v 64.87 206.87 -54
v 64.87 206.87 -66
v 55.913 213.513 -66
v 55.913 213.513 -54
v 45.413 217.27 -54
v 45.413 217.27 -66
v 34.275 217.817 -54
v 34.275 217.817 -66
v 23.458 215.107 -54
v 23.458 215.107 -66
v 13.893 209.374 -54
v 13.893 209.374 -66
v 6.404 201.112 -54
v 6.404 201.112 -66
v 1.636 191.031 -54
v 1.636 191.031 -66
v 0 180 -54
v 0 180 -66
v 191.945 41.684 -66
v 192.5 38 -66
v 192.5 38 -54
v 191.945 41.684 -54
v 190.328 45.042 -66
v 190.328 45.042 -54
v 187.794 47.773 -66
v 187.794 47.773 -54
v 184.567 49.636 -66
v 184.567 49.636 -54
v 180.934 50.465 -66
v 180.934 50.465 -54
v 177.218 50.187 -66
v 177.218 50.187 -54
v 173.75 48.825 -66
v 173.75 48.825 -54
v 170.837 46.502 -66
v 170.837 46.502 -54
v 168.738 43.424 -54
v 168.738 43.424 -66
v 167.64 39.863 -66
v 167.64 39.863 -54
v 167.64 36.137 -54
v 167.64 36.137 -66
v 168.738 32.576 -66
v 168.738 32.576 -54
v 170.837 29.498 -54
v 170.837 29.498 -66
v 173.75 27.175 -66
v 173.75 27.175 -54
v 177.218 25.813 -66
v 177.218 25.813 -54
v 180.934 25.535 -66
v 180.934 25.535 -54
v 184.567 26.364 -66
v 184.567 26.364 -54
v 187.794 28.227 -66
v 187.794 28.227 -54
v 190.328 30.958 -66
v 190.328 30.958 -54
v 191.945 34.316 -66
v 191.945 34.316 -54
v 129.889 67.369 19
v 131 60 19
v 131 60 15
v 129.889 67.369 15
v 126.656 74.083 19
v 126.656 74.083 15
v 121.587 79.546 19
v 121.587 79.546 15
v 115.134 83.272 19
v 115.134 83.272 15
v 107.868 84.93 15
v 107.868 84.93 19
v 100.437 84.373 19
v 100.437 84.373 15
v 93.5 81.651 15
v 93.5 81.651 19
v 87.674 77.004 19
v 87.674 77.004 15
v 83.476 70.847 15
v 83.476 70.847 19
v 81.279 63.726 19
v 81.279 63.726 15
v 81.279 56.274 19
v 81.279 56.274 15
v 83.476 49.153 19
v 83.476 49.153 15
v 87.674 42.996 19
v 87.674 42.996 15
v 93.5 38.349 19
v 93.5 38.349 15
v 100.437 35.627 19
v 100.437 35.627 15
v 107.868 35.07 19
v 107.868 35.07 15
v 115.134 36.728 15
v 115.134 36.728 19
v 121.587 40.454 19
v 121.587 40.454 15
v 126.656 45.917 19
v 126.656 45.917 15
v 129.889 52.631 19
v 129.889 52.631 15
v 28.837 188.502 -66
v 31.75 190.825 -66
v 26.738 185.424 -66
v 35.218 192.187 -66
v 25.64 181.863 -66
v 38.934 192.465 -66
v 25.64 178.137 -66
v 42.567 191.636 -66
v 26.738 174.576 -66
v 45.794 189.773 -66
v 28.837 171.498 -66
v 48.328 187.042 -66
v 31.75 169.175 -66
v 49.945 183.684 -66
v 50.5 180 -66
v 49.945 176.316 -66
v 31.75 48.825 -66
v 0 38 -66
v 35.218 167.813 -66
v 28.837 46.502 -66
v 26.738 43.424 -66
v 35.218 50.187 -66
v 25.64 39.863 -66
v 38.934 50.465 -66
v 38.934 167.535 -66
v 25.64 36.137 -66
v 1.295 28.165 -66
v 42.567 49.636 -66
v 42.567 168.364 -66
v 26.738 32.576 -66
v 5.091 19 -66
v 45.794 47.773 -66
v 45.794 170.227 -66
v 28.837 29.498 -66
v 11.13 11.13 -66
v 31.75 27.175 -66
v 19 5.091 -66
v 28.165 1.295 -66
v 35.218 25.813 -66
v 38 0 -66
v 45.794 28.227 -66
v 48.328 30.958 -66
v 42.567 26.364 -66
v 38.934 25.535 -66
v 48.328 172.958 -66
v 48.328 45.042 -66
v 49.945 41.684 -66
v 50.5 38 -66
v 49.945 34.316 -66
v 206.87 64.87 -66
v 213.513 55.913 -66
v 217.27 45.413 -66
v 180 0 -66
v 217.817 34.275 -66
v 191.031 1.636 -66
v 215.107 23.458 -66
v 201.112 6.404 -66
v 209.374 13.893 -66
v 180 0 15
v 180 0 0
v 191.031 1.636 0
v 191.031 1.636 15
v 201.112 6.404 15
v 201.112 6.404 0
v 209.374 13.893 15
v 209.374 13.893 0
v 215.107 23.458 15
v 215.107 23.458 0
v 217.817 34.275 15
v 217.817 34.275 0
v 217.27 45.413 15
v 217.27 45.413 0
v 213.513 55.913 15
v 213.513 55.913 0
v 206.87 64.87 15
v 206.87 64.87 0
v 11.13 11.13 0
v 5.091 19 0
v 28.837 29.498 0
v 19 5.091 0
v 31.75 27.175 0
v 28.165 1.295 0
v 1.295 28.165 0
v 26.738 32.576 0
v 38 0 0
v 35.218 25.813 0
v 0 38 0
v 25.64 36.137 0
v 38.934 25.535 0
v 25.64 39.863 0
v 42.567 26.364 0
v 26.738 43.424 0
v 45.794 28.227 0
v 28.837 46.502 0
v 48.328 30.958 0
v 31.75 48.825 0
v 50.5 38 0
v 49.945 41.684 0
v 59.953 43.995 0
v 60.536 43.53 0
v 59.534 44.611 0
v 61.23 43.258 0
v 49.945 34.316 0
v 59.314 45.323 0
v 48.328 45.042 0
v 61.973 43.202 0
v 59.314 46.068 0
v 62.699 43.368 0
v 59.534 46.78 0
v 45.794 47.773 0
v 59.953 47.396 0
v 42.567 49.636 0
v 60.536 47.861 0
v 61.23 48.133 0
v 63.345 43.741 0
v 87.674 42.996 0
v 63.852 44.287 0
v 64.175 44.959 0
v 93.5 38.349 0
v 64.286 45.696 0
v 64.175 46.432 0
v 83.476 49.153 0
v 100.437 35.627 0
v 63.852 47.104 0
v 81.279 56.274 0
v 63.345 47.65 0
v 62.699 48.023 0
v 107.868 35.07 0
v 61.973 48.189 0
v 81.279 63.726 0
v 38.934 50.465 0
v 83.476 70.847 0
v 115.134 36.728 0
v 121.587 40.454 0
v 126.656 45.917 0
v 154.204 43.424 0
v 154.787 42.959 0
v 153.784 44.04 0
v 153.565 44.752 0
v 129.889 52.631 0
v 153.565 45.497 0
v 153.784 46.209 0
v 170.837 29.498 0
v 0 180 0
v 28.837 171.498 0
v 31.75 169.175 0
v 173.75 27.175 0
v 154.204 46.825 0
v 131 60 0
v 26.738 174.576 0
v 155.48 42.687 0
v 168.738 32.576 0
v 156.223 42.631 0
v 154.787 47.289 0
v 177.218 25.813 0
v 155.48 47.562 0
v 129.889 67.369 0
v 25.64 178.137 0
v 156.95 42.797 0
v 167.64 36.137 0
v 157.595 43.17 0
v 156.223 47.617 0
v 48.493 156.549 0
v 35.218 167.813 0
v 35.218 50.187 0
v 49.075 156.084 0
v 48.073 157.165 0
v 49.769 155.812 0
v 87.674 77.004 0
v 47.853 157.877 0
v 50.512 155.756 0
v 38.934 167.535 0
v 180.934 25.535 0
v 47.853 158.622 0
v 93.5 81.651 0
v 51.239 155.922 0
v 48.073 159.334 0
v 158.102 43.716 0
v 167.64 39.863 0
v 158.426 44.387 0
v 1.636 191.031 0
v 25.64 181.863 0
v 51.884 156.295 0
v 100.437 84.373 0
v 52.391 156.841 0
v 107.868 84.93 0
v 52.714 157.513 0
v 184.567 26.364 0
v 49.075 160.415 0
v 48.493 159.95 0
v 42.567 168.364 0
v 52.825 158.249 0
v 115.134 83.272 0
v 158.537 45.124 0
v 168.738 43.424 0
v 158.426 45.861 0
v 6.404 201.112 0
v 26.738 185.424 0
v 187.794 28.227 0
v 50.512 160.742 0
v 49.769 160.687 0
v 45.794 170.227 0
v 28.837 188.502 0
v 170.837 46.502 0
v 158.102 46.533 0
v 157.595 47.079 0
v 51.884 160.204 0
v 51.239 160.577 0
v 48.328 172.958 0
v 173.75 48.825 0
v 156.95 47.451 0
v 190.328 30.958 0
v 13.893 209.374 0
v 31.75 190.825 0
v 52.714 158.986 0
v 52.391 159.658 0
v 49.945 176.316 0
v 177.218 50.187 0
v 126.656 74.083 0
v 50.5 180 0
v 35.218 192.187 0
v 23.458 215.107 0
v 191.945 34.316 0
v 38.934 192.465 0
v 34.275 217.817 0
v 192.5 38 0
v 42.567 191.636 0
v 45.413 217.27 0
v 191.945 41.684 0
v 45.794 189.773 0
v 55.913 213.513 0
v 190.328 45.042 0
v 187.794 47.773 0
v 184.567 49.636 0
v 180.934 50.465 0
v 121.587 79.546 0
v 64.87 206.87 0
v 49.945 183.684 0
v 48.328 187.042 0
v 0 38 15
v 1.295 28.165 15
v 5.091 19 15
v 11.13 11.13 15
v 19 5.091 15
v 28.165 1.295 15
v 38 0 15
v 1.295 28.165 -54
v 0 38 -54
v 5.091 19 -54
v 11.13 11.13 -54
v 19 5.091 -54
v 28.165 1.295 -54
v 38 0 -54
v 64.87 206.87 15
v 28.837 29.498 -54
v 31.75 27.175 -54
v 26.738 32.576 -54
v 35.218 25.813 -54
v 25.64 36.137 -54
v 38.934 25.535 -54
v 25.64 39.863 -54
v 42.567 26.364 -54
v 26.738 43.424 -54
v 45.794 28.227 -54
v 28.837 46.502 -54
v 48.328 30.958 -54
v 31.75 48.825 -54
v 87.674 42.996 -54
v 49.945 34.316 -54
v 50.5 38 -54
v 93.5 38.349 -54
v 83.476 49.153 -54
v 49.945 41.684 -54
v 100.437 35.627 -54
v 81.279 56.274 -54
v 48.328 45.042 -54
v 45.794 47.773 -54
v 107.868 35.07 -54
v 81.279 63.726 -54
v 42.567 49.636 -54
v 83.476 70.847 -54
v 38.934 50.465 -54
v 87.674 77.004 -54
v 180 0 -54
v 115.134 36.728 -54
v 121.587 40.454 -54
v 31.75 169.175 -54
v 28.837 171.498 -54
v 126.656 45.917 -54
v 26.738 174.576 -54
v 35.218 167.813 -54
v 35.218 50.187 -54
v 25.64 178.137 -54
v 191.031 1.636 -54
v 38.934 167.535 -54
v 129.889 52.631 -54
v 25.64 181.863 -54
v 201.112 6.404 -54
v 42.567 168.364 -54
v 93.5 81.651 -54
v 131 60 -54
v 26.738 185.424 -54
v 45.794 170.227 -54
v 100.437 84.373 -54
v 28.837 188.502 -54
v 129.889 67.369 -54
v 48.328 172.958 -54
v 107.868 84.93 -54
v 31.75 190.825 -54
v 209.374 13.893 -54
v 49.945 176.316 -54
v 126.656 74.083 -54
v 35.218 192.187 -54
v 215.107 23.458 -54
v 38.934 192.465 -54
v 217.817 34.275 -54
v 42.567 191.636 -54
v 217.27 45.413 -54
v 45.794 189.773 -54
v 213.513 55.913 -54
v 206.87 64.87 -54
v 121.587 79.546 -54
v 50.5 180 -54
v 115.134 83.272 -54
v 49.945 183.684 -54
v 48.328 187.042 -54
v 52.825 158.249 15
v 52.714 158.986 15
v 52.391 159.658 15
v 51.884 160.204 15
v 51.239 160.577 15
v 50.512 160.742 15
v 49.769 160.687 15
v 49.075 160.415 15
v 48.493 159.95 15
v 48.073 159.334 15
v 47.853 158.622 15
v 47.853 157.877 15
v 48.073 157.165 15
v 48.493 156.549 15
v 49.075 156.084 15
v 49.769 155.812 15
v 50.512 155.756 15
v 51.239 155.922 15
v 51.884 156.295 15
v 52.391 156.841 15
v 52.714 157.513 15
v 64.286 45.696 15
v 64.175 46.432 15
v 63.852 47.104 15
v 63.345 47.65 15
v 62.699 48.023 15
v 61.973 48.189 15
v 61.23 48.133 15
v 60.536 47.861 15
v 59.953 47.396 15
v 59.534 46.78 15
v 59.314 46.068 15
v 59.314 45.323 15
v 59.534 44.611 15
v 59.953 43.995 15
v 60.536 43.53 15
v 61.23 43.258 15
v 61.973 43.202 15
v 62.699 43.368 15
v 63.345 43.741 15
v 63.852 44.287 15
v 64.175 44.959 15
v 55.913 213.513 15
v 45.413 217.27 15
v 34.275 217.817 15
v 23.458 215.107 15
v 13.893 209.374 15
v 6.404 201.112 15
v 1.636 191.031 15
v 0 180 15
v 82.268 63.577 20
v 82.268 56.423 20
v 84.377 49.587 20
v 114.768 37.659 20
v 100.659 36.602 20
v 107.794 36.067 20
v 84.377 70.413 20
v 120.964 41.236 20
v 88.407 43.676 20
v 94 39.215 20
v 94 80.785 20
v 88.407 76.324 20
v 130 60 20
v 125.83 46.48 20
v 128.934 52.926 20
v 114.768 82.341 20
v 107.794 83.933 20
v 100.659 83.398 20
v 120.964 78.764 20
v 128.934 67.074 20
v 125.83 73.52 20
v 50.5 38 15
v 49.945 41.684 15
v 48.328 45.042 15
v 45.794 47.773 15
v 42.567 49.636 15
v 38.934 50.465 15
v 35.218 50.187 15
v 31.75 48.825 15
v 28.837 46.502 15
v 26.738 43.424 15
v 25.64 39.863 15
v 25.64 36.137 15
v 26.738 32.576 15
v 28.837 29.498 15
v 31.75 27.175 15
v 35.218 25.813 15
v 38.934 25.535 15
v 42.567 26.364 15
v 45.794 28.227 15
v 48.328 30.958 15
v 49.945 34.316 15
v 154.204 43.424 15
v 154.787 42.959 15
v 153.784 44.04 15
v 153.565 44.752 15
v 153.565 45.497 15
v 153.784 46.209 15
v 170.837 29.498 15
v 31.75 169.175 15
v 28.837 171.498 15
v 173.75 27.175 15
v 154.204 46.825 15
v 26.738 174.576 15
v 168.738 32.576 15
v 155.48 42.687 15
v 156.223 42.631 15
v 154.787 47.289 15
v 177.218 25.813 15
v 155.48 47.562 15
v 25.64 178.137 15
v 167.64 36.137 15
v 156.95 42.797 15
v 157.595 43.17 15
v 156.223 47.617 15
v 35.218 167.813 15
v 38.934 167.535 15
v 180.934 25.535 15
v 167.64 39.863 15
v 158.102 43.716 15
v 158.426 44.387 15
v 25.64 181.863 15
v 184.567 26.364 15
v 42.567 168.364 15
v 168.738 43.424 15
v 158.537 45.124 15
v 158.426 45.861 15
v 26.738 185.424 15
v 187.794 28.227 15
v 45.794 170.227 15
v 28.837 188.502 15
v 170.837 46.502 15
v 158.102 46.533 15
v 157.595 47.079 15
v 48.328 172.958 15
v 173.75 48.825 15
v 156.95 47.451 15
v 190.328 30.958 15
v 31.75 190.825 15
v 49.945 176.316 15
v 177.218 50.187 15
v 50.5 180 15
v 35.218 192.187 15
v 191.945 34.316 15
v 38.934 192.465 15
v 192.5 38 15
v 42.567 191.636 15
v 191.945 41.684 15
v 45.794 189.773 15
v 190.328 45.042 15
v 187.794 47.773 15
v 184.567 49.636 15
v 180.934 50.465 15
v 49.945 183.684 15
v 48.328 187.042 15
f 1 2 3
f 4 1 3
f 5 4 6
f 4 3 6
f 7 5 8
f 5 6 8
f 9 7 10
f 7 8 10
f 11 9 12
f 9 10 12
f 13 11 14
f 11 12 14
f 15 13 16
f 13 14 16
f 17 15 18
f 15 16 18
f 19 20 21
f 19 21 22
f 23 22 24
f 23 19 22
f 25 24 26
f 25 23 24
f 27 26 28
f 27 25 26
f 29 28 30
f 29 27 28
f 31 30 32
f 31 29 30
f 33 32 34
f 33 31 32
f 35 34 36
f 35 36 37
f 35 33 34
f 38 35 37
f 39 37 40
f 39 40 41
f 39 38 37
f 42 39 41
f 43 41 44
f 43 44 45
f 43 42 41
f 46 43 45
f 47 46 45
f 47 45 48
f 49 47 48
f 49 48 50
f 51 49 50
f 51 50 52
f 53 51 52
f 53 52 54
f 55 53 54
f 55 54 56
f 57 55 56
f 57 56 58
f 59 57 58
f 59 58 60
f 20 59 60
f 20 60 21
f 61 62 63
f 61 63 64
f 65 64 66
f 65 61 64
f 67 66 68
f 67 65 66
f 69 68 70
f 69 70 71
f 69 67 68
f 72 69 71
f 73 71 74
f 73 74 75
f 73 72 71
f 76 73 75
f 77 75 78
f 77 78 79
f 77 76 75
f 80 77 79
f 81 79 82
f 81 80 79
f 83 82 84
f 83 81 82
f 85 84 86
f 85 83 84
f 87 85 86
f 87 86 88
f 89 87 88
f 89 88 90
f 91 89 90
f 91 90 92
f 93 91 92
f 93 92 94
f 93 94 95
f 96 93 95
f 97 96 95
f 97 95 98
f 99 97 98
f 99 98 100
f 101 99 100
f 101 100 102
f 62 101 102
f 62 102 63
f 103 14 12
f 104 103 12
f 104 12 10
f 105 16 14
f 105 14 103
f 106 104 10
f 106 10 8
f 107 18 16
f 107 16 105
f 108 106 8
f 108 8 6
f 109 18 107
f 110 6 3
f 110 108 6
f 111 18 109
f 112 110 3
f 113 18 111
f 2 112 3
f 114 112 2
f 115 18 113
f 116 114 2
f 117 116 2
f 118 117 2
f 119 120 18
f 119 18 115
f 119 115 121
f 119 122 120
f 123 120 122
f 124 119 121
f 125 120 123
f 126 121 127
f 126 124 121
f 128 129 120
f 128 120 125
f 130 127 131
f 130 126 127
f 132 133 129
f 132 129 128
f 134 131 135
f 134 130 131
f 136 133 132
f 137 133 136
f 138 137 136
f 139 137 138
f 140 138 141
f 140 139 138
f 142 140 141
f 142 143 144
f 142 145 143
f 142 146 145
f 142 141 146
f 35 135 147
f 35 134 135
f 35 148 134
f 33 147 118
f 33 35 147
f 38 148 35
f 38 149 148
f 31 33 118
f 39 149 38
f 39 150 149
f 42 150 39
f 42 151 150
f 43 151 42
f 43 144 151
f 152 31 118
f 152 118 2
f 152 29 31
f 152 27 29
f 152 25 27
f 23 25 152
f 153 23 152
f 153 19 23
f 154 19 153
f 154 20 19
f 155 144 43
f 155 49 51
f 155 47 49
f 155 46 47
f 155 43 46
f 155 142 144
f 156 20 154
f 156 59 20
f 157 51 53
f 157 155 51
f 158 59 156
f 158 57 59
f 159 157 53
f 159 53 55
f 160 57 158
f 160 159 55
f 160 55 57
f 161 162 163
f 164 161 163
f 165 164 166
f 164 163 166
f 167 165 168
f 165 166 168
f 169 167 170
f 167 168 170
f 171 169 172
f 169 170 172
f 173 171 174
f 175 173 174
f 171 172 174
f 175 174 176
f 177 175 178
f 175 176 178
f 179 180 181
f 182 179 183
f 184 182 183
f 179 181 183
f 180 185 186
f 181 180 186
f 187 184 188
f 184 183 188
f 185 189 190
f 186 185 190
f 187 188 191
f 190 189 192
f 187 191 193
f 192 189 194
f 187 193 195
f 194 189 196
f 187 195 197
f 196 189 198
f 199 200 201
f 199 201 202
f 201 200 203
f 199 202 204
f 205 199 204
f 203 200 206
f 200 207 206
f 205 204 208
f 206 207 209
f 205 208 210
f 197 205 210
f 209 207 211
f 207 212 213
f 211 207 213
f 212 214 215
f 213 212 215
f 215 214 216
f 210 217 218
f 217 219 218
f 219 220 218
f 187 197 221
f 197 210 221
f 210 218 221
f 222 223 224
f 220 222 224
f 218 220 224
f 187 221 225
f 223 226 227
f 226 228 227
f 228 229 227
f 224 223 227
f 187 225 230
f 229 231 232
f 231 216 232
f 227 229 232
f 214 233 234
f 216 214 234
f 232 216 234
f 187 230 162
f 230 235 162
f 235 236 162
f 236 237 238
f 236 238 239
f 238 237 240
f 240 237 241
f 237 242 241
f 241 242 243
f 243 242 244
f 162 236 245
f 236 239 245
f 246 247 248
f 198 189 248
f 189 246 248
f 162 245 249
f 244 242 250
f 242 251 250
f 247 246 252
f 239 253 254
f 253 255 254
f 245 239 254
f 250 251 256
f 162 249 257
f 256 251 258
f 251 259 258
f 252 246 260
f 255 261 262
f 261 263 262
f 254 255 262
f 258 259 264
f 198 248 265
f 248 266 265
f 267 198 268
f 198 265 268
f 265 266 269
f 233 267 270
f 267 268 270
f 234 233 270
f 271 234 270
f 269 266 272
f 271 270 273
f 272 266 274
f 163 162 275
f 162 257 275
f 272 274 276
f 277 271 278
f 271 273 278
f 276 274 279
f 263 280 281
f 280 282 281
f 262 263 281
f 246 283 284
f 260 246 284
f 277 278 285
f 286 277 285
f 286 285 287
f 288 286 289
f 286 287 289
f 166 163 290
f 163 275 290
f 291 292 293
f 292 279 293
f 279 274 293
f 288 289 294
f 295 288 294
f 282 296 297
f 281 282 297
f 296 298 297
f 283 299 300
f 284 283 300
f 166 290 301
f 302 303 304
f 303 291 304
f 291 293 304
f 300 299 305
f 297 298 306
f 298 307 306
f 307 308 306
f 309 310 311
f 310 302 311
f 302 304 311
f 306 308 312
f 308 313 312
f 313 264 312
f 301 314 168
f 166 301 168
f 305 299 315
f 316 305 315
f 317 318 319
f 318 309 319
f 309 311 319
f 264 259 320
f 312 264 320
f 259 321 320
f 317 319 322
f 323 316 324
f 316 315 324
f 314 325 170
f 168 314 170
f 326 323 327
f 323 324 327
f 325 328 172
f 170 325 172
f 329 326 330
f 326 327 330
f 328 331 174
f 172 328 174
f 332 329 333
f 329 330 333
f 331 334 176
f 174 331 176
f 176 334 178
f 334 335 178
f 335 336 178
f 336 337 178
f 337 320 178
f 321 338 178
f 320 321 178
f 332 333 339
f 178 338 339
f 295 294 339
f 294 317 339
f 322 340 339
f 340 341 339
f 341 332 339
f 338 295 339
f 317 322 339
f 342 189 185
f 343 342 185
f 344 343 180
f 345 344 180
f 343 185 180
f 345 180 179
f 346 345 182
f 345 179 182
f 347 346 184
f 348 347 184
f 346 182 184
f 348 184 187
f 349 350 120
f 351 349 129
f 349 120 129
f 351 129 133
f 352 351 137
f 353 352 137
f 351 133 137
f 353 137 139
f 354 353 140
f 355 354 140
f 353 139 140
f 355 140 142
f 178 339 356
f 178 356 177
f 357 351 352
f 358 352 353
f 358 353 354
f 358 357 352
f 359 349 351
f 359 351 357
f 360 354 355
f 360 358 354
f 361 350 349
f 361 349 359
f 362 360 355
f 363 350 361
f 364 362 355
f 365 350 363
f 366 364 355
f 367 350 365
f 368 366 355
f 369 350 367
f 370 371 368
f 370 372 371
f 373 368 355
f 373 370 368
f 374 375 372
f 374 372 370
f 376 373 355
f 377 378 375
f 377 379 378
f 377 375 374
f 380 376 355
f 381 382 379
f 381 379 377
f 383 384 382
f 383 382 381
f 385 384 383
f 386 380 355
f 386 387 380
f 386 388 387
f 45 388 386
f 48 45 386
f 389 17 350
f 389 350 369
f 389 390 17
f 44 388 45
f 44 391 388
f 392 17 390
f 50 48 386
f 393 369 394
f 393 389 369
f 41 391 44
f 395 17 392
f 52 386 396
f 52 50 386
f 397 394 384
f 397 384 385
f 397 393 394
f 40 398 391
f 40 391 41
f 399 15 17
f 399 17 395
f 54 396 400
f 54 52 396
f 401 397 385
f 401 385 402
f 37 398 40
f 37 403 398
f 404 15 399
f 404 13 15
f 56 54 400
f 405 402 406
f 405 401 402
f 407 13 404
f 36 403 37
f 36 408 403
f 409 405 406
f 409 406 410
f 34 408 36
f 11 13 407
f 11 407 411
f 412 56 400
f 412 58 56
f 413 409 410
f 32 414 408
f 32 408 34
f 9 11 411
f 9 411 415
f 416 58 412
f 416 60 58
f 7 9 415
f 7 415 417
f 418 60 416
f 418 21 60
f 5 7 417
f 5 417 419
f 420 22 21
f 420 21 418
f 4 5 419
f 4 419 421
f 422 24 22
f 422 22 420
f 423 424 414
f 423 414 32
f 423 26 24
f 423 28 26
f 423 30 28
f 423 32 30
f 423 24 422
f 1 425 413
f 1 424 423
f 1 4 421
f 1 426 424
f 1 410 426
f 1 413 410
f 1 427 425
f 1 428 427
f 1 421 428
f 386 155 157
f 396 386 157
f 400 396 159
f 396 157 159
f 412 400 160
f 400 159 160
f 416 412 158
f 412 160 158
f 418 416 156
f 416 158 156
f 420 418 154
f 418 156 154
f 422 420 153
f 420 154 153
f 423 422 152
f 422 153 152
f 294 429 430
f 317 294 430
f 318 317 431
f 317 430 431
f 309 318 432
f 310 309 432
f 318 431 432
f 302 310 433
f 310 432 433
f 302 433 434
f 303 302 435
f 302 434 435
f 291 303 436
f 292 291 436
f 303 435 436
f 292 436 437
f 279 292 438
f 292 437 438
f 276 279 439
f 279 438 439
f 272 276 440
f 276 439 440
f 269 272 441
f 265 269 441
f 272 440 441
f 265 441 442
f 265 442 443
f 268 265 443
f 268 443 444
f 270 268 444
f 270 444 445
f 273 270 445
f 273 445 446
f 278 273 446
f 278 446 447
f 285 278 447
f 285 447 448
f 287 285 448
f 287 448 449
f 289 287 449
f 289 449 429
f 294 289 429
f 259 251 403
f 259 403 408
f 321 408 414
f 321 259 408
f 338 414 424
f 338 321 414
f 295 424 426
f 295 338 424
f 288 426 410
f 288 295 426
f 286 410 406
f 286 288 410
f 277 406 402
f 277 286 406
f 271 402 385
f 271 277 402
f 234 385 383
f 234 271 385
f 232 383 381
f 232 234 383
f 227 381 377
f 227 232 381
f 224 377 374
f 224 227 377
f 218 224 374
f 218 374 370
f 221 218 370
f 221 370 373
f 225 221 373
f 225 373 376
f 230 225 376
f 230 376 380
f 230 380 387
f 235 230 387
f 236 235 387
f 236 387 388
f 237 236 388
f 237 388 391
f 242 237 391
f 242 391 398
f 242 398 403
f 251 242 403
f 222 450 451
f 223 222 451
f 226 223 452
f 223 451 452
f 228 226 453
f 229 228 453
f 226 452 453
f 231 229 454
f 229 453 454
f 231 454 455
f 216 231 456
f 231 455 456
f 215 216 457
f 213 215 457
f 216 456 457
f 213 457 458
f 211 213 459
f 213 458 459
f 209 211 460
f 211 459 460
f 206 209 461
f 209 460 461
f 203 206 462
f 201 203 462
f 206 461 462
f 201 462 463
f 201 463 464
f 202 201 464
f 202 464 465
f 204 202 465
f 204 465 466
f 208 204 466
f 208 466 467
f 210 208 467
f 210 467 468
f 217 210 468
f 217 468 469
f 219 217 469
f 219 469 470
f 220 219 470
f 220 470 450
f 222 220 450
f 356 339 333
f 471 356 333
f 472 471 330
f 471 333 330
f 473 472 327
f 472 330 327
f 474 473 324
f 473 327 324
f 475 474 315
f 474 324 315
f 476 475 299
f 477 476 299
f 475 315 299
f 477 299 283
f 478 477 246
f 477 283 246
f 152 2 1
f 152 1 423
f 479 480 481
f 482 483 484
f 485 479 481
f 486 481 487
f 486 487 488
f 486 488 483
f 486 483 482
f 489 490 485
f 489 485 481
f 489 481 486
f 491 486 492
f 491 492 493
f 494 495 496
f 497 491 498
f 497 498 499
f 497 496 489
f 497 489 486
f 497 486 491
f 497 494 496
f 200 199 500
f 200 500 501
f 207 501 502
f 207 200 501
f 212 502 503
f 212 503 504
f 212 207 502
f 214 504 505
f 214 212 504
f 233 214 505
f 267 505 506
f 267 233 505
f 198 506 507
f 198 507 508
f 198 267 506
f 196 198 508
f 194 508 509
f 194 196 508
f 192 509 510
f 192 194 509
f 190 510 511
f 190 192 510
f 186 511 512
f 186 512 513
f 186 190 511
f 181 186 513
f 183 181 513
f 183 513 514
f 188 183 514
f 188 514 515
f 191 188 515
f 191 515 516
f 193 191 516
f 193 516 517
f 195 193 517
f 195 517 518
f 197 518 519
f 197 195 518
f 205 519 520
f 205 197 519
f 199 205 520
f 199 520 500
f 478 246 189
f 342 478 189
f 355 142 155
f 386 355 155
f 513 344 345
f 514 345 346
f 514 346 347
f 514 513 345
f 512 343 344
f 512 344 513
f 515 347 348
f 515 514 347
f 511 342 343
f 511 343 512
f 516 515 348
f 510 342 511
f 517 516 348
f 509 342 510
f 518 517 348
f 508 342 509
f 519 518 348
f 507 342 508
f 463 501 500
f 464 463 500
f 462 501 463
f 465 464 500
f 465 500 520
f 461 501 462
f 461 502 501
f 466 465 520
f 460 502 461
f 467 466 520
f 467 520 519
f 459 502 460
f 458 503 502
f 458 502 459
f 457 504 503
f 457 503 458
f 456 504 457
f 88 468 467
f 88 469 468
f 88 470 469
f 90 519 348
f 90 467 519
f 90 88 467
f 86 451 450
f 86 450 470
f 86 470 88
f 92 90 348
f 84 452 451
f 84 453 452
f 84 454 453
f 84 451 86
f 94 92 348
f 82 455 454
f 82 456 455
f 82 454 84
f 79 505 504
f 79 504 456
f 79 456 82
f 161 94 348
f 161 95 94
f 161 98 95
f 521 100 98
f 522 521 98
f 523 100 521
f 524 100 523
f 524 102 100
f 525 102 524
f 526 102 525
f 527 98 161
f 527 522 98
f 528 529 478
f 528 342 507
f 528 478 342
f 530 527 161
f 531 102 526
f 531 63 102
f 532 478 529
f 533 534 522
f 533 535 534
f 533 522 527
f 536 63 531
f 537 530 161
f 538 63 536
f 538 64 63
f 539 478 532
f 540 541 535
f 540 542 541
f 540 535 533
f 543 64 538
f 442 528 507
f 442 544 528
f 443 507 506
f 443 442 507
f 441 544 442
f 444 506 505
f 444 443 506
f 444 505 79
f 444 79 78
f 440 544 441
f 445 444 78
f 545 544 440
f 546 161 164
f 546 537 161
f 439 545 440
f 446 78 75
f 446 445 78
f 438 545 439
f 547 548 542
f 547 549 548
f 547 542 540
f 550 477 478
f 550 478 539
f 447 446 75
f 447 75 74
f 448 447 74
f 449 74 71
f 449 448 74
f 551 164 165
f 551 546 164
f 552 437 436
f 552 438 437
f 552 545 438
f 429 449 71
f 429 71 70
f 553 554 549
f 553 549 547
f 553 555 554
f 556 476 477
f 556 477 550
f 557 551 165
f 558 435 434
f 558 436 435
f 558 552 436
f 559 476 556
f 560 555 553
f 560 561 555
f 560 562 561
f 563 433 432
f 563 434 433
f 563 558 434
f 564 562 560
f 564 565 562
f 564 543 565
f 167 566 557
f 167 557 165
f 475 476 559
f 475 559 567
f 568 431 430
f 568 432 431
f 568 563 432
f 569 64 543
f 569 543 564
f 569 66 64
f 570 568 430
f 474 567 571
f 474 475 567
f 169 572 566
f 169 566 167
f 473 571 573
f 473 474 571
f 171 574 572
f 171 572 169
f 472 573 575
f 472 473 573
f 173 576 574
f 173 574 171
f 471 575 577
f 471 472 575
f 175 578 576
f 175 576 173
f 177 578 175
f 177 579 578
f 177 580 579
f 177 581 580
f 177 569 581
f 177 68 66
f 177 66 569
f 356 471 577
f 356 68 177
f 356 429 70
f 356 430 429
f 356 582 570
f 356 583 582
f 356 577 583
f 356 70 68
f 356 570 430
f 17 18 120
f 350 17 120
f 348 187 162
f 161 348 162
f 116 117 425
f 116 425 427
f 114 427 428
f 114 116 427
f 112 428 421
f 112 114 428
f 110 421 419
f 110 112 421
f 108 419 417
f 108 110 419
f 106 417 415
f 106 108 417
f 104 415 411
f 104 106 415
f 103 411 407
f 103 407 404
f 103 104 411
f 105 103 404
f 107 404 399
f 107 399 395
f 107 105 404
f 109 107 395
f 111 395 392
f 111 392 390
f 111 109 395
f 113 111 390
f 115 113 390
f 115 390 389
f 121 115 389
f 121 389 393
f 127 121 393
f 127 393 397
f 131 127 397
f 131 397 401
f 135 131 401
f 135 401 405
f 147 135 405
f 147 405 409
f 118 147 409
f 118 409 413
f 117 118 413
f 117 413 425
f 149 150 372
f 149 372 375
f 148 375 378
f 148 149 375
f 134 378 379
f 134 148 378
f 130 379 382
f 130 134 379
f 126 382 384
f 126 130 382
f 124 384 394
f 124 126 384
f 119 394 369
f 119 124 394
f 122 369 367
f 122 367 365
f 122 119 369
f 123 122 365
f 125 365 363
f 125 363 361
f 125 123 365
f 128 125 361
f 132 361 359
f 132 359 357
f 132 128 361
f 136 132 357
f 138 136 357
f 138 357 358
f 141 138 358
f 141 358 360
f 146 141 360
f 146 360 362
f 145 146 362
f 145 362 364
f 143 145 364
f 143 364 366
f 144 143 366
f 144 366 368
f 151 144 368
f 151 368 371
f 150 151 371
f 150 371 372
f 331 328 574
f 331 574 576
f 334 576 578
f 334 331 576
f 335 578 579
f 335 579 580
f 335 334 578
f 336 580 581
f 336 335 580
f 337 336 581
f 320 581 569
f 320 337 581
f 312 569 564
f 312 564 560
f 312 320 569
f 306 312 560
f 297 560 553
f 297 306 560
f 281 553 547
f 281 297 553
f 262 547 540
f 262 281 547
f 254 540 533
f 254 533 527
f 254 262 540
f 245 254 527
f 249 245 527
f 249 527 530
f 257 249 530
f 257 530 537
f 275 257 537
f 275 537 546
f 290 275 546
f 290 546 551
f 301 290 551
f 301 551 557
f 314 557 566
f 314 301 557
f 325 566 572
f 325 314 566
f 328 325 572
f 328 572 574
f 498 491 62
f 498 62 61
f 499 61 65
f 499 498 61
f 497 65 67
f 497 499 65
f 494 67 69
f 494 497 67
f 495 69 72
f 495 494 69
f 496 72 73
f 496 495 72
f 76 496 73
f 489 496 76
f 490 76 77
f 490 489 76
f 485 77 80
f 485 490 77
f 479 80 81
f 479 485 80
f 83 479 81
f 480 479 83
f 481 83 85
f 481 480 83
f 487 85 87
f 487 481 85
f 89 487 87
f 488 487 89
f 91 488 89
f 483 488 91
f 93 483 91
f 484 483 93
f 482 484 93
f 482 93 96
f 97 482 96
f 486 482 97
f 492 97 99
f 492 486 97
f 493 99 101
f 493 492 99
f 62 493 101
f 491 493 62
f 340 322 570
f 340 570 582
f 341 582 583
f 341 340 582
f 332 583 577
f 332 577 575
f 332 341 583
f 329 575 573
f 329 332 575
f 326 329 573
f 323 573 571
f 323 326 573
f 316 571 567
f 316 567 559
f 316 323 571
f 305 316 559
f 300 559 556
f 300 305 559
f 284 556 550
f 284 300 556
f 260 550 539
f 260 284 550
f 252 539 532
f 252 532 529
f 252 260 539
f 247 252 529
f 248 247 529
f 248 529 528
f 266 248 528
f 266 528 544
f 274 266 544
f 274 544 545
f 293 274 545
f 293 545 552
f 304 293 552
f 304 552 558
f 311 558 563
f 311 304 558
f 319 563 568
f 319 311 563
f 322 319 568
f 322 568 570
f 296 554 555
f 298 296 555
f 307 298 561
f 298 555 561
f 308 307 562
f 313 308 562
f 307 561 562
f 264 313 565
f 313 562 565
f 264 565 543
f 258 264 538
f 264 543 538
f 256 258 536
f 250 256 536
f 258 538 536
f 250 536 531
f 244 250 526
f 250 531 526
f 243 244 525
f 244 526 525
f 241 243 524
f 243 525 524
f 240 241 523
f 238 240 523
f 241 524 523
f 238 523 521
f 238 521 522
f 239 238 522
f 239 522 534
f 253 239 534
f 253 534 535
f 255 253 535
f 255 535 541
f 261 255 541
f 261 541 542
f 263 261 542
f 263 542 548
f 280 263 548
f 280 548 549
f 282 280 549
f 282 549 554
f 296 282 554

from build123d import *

# Parameters (mm, degrees)
SKETCH006_R         = 12.5
PAD001_DEPTH        = 15
SKETCH007_R         = 25
PAD002_DEPTH        = 74
LINEARPATTERN_COUNT = 2
LINEARPATTERN_PITCH = 69
SKETCH008_W         = 252.12847
SKETCH008_H         = 13.500198
POCKET002_DEPTH     = 218.001
SKETCH009_R         = 2.5
HOLE001_DEPTH       = 16
CHAMFER001_SIZE     = 1


with BuildPart() as part:
    # Sketch006 → Pad001 (new body)
    with BuildSketch(Plane.XY):
        with BuildLine():
            ThreePointArc((0, 38), (11.129942, 11.129942), (38, 0))
            Line((38, 0), (180, 0))
            ThreePointArc((180, 0), (215.107422, 23.45803), (206.870058, 64.870058))
            Line((64.870058, 206.870058), (206.870058, 64.870058))
            ThreePointArc((64.870058, 206.870058), (23.45803, 215.107422), (0, 180))
            Line((0, 180), (0, 38))
        make_face()
        with Locations((38, 180)):
            Circle(SKETCH006_R, mode=Mode.SUBTRACT)
        with Locations((180, 38)):
            Circle(SKETCH006_R, mode=Mode.SUBTRACT)
        with Locations((38, 38)):
            Circle(SKETCH006_R, mode=Mode.SUBTRACT)
    pad001 = extrude(amount=PAD001_DEPTH)

    # Sketch007 (on DatumPlane) → Pad002 (join)
    with BuildSketch(Plane.XY.offset(20)):
        with Locations((106, 60)):
            Circle(SKETCH007_R)
    extrude(amount=-PAD002_DEPTH)

    # LinearPattern: Pad001 ×2
    with Locations(*[(0, 0, -i * LINEARPATTERN_PITCH) for i in range(1, LINEARPATTERN_COUNT)]):
        add(pad001)

    # Sketch008 (on DatumPlane) → Pocket002 (cut, through all)
    with BuildSketch(Plane.XZ):
        with Locations((99.729314, -72.750099)):
            Rectangle(SKETCH008_W, SKETCH008_H)
    extrude(amount=-POCKET002_DEPTH, mode=Mode.SUBTRACT)

    # Sketch009 (on Face23 of LinearPattern) → Hole001 (cut)
    with BuildSketch(Plane.XY.offset(15)):
        with Locations((50.325314, 158.249445)):
            Circle(SKETCH009_R)
        with Locations((61.786113, 45.695507)):
            Circle(SKETCH009_R)
        with Locations((156.036591, 45.124257)):
            Circle(SKETCH009_R)
    extrude(amount=-HOLE001_DEPTH, mode=Mode.SUBTRACT)

    # Chamfer001
    chamfer001_edges = [part.edges().sort_by_distance(p)[0] for p in [
        (81, 60, 20),
    ]]
    chamfer(chamfer001_edges, length=CHAMFER001_SIZE)


solid = part.part
